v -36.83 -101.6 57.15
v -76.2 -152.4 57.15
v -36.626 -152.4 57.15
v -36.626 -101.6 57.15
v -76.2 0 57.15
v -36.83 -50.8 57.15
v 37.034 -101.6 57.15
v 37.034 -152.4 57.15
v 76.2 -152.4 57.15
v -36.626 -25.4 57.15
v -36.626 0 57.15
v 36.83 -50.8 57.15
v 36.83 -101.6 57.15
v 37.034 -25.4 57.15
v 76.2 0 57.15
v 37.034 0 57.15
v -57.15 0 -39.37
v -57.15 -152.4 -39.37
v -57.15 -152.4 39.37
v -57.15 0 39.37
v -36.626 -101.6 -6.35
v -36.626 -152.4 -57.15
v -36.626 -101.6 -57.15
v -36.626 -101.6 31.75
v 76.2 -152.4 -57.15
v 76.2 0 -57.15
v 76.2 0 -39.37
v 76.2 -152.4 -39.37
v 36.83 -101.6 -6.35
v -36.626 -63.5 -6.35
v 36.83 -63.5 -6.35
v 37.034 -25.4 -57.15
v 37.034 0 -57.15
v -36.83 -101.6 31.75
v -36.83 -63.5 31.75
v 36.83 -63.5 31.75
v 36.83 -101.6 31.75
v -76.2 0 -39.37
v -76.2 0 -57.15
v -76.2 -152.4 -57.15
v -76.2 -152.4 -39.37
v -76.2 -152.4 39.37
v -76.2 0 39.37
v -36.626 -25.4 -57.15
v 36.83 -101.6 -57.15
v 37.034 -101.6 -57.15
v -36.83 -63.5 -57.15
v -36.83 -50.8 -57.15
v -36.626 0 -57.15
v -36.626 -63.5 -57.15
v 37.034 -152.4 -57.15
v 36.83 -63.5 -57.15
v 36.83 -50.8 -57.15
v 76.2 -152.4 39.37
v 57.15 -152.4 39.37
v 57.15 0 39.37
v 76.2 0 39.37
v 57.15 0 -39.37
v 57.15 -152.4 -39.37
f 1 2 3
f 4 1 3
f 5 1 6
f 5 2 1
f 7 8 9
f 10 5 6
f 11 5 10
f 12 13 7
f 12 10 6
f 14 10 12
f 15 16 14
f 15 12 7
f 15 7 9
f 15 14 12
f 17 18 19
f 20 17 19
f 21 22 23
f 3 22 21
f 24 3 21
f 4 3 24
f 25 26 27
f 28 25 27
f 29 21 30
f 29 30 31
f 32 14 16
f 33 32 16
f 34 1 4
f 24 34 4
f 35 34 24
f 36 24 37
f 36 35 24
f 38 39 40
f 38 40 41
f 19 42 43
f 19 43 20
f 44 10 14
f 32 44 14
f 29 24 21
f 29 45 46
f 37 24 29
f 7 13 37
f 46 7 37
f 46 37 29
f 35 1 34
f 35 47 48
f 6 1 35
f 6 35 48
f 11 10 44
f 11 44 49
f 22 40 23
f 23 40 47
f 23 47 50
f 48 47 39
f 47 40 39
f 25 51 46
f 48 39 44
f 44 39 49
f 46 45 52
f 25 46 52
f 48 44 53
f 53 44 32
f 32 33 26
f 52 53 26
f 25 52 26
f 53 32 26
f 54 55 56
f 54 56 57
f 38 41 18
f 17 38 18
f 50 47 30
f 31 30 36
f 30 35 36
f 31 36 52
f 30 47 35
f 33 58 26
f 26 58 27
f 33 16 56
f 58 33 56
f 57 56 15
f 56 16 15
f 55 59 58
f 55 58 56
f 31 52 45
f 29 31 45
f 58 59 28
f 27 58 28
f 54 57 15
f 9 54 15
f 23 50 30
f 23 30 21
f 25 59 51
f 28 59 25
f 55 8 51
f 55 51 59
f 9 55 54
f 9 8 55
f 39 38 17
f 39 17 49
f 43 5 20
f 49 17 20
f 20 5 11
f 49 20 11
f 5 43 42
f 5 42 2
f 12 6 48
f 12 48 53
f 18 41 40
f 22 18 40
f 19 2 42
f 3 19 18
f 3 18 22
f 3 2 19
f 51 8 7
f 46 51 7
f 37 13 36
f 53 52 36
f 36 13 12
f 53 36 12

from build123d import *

# Parameters (mm, degrees)
F0_W      = 152.4
F0_H      = 114.3
F1_DEPTH  = 152.4
F2_W      = 19.05
F2_H      = 78.74
F3_DEPTH  = 152.401
F4_DEPTH  = 152.401
F5_W      = 73.66
F5_H      = 50.8
F5_H_2    = 25.4
F6_DEPTH  = 114.301
F7_W      = 73.66
F7_H      = 12.7
F8_DEPTH  = 114.301
F9_DEPTH  = 25.4
F10_W     = 73.456201
F10_H     = 38.1
F11_DEPTH = 50.8


with BuildPart() as f1:
    # F0 (on Front) → F1 (new body)
    with BuildSketch(Plane.XZ):
        Rectangle(F0_W, F0_H)
    extrude(amount=F1_DEPTH)

    # F2 (on face) → F3 (cut, through all)
    with BuildSketch(Plane.XZ.offset(152.4)):
        with Locations((-66.675, 0)):
            Rectangle(F2_W, F2_H)
    extrude(amount=-F3_DEPTH, mode=Mode.SUBTRACT)

    # F2 (on face) → F4 (cut, through all)
    with BuildSketch(Plane.XZ.offset(152.4)):
        with Locations((66.675, 0)):
            Rectangle(F2_W, F2_H)
    extrude(amount=-F4_DEPTH, mode=Mode.SUBTRACT)

    # F5 (on face) → F6 (cut, through all)
    with BuildSketch(Plane.XY.offset(57.15)):
        with Locations((0.203799, -127)):
            Rectangle(F5_W, F5_H)
        with Locations((0.203799, -12.7)):
            Rectangle(F5_W, F5_H_2)
    extrude(amount=-F6_DEPTH, mode=Mode.SUBTRACT)

    # F7 (on face) → F8 (cut, through all)
    with BuildSketch(Plane.XY.offset(57.15)):
        with Locations((0, -57.15)):
            Rectangle(F7_W, F7_H)
    extrude(amount=-F8_DEPTH, mode=Mode.SUBTRACT)

    # F7 (on face) → F9 (cut)
    with BuildSketch(Plane.XY.offset(57.15)):
        Polygon((-36.83, -63.5), (-36.83, -101.6), (-36.626201, -101.6), (36.83, -101.6), (36.83, -63.5), align=None)
    extrude(amount=-F9_DEPTH, mode=Mode.SUBTRACT)

    # F10 (on face) → F11 (cut)
    with BuildSketch(Plane(origin=(0, 0, -57.15), x_dir=(1, 0, 0), z_dir=(0, 0, -1))):
        with Locations((0.101899, 82.55)):
            Rectangle(F10_W, F10_H)
    extrude(amount=-F11_DEPTH, mode=Mode.SUBTRACT)


solid = f1.part
